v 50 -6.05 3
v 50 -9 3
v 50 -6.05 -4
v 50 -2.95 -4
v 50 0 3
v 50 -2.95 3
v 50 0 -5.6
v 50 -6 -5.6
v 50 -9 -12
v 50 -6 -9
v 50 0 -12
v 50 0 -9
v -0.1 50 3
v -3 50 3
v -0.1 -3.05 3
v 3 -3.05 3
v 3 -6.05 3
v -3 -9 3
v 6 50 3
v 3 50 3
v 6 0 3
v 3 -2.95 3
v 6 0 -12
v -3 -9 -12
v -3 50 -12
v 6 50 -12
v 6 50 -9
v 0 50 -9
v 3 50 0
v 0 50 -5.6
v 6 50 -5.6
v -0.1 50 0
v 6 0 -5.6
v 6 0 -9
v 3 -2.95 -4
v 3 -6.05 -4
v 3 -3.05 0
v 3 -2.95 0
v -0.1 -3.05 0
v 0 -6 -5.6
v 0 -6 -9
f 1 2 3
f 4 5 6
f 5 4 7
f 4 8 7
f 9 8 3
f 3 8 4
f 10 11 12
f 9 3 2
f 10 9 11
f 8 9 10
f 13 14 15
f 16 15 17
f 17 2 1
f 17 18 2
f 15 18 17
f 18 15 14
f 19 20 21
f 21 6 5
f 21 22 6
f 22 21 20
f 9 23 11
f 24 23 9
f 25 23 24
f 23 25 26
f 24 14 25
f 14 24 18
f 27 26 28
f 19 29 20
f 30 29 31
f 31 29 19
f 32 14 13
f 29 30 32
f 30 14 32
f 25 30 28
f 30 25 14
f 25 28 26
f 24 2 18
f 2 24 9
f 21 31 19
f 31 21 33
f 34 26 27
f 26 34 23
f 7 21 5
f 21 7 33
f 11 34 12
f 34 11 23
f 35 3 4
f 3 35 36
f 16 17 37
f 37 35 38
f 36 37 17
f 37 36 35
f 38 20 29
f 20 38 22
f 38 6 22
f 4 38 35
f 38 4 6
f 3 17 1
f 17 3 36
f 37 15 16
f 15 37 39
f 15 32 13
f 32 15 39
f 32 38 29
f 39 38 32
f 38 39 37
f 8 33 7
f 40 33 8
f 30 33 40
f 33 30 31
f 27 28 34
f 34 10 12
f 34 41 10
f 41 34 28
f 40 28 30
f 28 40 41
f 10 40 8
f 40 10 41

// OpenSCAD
// Plates
// 340x390x3 x4 = 0.53m2
// 340x358x3 x1 = 0.12m2
//                0.65m2

wall_thickness = 3;
height = 390;
width = 340;
depth = 340;

offset = 0.1; // Additional space for connectors
edge_height = 12;

if ($preview) {
    #box();
}

// bottom edges
translate([(width - 240) / 2, -9, -3]) bottom_edge(width = 240);
translate([(width - 240) / 2, 6 + depth, -3]) bottom_edge(width = 240);
translate([6, (width - 240) / 2, -3]) rotate([0, 0, 90]) bottom_edge(width = 246);
translate([3 + depth, (width - 240) / 2, -3]) rotate([0, 0, 90]) bottom_edge(width = 246);

// bottom corners
translate([-3, -9, -3]) bottom_corner();
mirror([1, 0, 0]) translate([-width - 3, -9, -3]) bottom_corner();
translate([width, depth + 6, 0]) rotate([0, 0, 180]) {
    translate([-3, -9, -3]) bottom_corner();
    mirror([1, 0, 0]) translate([-width - 3, -9, -3]) bottom_corner();
}

// top-bottom corners
translate([-3, -9, edge_height - 3]) top_bottom_corner();

// top corners
mirror([0, 0, 1]) {
    translate([0, 0, -height]) {
        !translate([-3, -9, -3]) top_corner();
        mirror([1, 0, 0]) translate([-width - 3, -9, -3]) top_corner();
        translate([width, depth + 6, 0]) rotate([0, 0, 180]) {
            translate([-3, -9, -3]) top_corner();
            mirror([1, 0, 0]) translate([-width - 3, -9, -3]) top_corner();
        }
    }
}

// top edges
translate([(width - 240) / 2, -9, height - 12]) top_edge(width = 240);

module box() {
    // Front
    translate([0, -wall_thickness * 2, 0]) 
        cube([width, wall_thickness, height]);

    // Back
    translate([0, depth + wall_thickness + wall_thickness * 2, 0]) 
        cube([width, wall_thickness, height]);

    // Left
    translate([0, wall_thickness, 0]) 
        cube([wall_thickness, depth, height]);

    // Right
    translate([depth - wall_thickness, wall_thickness, 0]) 
        cube([wall_thickness, depth, height]);

    // Top
    translate([0, -6, height + wall_thickness * 2]) 
        cube([width, depth + 18, wall_thickness]);
}

module bottom_edge(width = 200) {
    color([0.3, 0.3, 0.3]) difference() {
        cube([width, 9, edge_height]);
        translate([-1, (9 - wall_thickness) / 2 - offset / 2, 3]) 
            cube([width + 2, wall_thickness + offset, edge_height]);
    }
}

module top_edge(width = 200) {
    color([0.3, 0.3, 0.3]) difference() {
        cube([width, 9, edge_height + 9]);
        translate([-1, (9 - wall_thickness) / 2 - offset / 2, -3]) 
            cube([width + 2, wall_thickness + offset, edge_height]);
        translate([-1, 3, 12 + wall_thickness * 2 - offset / 1 -offset]) 
            cube([width + 2, 6 + wall_thickness * 2, wall_thickness + offset*3]);
    }
}

module bottom_corner() {
    color([0.5, 0.5, 0.5]) difference() {
        translate([0, 0, 0]) {
            cube([53, 53, edge_height]);
        }
        translate([9, 9, -1]) cube([53, 59, 50]);
        translate([6, (9 - wall_thickness) / 2 - offset / 2, 3]) 
            cube([width + 2, wall_thickness + offset, edge_height * 3]);
        translate([6, (15 - wall_thickness) / 2 - offset / 2, 3]) 
            rotate([0, 0, 90]) 
                cube([width + 2, wall_thickness + offset, edge_height * 3]);
    }
}

module top_corner() {
    color([0.5, 0.5, 0.5]) difference() {
        translate([0, 0, 0]) {
            translate([0, 0, -9]) cube([53, 59, edge_height + 3]);
        }
        translate([9, 9, -10]) cube([53, 59, 70]);
        translate([6, (9 - wall_thickness) / 2 - offset / 2, -1]) 
            cube([width + 2, wall_thickness + offset, edge_height * 3]);
        translate([6, (15 - wall_thickness) / 2 - offset / 2, 3]) 
            rotate([0, 0, 90]) 
                cube([width + 2, wall_thickness + offset, edge_height * 3]);
                
        translate([3, 3, -12 + wall_thickness * 2]) 
            cube([width / 3, depth / 3+ wall_thickness * 2, wall_thickness + offset * 4]);
    }
}

module top_bottom_corner() {
    edge_height = 8;
    color([0.3, 0.3, 0.3]) difference() {
        translate([0, 0, 0]) {
            translate([0, 0, edge_height]) 
                cube([edge_height, edge_height + 7, (height - edge_height * 3 - 9) / 2]);
        }
        translate([9, 9, -1]) cube([53, 59, height + 50]);
        translate([3, (9 - wall_thickness) / 2 - offset / 2, 3]) 
            cube([width + 2, wall_thickness + offset, height + edge_height * 3]);
        translate([6, (27 - wall_thickness) / 2 - offset / 2, 3]) 
            rotate([0, 0, 90]) 
                cube([width + 2, wall_thickness + offset, height + edge_height * 3]);
    }
}

if ($preview) {
    translate([140, 140, 70]) import("C:/Users/darek/Downloads/PrusaMini+_aligned.stl");
}
